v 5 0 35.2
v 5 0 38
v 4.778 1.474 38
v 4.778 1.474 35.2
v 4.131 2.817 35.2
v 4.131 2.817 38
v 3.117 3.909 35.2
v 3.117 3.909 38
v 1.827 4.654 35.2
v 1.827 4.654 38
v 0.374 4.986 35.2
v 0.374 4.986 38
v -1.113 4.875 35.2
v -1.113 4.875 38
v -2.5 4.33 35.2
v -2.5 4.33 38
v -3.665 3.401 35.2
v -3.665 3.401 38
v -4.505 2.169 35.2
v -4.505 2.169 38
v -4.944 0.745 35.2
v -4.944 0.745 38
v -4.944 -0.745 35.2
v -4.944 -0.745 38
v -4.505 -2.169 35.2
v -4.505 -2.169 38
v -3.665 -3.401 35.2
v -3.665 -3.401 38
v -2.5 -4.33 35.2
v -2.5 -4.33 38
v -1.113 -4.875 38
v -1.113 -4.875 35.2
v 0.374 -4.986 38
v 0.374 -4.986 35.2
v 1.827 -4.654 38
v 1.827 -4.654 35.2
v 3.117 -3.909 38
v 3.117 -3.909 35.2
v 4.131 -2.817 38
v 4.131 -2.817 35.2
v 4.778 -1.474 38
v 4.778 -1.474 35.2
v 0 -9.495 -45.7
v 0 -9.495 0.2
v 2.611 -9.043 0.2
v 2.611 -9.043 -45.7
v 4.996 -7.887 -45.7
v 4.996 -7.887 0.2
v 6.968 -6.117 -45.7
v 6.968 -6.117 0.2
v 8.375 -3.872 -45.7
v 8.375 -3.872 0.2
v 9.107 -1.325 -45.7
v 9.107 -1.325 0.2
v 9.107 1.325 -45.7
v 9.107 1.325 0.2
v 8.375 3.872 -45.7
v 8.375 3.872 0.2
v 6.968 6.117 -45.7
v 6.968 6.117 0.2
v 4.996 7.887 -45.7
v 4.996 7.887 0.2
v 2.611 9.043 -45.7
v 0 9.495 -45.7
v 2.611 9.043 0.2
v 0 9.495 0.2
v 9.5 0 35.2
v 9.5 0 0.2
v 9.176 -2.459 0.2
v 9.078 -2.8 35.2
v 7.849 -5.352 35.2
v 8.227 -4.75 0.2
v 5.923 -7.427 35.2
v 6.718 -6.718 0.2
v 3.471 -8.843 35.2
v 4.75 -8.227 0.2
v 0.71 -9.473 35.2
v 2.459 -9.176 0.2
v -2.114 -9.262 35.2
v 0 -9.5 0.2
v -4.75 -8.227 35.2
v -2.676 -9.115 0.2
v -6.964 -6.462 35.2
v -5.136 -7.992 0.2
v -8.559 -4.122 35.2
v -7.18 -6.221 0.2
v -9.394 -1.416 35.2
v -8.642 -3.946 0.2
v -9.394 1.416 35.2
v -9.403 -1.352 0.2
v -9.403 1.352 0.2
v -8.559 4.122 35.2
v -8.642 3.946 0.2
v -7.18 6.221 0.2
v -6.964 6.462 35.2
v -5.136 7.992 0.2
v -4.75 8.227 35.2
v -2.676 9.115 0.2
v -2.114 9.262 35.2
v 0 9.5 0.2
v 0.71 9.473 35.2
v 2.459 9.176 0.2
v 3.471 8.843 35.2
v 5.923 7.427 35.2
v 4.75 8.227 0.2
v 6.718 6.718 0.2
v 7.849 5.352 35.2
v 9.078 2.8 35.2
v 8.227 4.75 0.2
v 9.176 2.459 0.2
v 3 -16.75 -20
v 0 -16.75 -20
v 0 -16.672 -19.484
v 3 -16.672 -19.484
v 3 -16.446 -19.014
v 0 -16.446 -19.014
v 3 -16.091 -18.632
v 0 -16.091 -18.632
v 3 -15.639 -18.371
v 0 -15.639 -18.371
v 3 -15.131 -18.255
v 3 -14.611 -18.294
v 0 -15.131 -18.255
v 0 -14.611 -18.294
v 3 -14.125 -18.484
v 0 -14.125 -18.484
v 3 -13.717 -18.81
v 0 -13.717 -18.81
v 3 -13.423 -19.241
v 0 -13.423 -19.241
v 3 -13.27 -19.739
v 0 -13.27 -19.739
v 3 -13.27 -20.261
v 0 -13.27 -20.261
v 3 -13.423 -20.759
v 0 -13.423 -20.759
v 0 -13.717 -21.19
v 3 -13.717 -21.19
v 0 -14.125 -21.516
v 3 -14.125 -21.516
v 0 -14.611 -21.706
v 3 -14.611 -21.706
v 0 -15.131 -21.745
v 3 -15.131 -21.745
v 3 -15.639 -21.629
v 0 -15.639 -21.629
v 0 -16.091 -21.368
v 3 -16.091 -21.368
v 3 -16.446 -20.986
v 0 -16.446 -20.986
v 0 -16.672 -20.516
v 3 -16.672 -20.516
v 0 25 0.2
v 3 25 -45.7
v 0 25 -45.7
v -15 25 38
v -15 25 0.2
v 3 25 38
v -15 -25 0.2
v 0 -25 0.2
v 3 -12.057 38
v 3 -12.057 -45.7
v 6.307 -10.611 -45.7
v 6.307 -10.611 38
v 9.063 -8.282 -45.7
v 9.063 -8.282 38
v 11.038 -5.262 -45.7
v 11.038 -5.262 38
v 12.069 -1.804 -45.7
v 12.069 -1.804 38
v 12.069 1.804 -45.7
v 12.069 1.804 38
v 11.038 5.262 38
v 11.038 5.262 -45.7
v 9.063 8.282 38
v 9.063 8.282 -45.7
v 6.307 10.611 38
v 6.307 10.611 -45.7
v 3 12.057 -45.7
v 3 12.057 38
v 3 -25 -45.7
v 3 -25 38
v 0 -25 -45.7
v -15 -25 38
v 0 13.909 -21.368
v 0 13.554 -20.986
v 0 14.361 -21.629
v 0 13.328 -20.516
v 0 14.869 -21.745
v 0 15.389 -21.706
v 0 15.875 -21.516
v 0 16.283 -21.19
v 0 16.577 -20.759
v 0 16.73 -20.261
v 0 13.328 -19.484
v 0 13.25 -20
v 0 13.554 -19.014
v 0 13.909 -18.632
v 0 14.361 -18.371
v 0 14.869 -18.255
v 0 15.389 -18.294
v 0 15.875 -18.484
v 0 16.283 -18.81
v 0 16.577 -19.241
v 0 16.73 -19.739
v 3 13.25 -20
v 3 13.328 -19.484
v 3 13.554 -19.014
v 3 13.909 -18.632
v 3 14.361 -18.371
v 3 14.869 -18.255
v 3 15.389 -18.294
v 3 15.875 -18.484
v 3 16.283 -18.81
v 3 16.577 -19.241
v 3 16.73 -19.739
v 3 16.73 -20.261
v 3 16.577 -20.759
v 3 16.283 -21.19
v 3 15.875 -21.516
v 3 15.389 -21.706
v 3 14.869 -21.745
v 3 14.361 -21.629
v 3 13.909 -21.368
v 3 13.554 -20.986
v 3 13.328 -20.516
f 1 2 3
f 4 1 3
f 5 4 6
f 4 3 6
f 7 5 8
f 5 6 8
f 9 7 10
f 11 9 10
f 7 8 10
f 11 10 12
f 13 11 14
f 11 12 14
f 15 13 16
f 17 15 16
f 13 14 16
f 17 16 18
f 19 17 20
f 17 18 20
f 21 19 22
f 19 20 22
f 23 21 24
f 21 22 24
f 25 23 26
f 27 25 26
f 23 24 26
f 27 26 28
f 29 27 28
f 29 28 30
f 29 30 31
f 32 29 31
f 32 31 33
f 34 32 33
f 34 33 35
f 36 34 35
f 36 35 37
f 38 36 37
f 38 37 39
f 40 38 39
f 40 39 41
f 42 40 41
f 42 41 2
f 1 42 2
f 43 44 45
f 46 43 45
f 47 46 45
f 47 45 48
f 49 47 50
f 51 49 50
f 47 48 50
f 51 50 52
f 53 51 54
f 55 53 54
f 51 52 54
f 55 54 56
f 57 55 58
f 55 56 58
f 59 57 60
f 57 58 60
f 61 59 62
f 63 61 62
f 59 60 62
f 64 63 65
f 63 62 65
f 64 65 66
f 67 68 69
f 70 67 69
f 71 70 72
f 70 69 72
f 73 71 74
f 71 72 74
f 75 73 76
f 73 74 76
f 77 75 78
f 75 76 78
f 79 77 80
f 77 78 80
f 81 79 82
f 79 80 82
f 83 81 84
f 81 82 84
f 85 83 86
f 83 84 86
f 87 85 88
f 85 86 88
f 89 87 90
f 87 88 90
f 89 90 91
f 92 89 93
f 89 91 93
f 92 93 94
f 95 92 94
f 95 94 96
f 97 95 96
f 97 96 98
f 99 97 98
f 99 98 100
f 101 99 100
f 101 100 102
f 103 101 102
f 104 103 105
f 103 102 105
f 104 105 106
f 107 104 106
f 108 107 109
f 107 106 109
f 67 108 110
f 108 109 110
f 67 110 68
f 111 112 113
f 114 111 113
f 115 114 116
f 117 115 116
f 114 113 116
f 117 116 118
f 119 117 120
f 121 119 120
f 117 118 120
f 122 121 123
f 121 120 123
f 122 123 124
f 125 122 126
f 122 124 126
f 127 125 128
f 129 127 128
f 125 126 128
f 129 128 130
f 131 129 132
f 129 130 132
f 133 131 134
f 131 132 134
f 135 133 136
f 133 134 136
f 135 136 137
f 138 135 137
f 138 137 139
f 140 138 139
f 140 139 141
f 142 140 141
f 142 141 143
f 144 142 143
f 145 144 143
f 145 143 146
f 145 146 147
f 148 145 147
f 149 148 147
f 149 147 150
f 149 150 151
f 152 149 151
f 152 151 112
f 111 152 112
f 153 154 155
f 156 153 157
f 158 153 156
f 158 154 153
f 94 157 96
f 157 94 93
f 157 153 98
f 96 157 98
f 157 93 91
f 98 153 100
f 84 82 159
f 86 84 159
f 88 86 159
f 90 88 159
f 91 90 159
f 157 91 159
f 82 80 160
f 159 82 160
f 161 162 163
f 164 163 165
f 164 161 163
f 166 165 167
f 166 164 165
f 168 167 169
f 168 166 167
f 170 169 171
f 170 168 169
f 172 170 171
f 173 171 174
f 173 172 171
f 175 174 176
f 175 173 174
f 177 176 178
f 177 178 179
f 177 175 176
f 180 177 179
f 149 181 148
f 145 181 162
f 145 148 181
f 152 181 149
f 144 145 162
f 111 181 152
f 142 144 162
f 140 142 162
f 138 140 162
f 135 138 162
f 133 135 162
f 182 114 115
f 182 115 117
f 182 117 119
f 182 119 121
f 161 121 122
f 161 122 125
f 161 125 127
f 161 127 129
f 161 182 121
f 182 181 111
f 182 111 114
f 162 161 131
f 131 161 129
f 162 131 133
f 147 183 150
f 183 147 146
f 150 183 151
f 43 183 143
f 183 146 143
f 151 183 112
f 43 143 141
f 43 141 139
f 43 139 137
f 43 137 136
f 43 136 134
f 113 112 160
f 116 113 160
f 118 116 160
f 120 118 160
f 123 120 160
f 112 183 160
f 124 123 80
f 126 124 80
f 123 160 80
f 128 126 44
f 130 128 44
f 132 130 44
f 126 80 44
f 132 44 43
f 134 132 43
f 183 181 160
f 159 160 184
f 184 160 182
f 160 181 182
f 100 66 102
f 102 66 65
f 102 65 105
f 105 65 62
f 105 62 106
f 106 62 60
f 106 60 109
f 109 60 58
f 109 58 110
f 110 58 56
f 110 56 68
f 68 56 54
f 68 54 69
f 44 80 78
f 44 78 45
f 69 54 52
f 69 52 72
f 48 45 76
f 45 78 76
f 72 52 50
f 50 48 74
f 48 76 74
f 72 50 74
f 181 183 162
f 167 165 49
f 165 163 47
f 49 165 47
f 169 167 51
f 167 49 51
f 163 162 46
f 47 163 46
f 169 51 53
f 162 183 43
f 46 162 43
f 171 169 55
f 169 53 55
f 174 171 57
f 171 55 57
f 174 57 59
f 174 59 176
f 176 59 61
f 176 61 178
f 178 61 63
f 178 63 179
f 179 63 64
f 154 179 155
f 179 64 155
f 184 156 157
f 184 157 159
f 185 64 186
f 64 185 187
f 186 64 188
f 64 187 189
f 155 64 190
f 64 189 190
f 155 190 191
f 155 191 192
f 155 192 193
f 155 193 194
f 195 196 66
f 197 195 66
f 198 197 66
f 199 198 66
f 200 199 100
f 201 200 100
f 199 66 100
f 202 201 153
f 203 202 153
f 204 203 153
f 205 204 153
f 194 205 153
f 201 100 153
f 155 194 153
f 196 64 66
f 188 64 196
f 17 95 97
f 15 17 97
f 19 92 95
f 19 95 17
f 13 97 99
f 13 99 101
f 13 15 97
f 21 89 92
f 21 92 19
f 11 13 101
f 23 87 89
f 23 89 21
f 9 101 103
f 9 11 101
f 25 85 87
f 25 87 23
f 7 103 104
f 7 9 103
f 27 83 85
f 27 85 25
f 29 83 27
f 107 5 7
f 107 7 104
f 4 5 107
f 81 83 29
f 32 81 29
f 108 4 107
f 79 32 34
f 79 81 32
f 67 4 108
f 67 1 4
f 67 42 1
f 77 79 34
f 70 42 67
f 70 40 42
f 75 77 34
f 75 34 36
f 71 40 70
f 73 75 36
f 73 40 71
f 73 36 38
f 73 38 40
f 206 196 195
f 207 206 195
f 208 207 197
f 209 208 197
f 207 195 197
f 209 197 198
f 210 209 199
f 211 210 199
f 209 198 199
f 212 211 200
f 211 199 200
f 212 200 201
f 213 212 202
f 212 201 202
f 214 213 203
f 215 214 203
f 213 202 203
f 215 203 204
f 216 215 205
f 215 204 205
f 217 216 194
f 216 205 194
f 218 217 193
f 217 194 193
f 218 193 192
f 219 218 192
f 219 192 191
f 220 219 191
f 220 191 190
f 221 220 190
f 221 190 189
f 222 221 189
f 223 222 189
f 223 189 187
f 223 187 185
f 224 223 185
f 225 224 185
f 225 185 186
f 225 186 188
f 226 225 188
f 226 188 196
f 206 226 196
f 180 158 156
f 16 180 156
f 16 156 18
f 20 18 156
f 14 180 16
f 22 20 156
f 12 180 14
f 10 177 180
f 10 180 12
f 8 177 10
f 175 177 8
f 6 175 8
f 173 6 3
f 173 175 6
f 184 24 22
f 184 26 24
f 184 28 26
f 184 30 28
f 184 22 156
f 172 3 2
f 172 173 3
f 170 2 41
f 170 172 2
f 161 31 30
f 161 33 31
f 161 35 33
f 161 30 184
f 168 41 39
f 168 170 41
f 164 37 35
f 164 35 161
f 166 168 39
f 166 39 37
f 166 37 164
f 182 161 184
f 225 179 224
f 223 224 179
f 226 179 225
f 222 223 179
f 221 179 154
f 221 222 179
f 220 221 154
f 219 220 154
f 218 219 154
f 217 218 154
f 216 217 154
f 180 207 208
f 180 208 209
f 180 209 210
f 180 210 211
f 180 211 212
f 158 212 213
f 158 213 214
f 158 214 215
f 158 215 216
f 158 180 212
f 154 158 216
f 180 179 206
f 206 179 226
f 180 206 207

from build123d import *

# Parameters (mm, degrees)
F1_DEPTH  = 16
F2_R      = 9.5
F3_DEPTH  = 35
F5_DEPTH  = 40
F6_DEPTH  = 45.7
F7_W      = 50
F7_H      = 37.8
F8_DEPTH  = 15
F9_R      = 9.5
F10_DEPTH = 35
F11_R     = 5
F12_DEPTH = 25
F13_R     = 1.75
F14_DEPTH = 5


with BuildPart() as f1:
    # F0 (on Right) → F1 (new body)
    with BuildSketch(Plane.YZ):
        Polygon((-25, 0), (0, 0), (25, 0), (25, 38), (-25, 38), align=None)
    extrude(amount=F1_DEPTH)

    # F2 (on face) → F3 (cut)
    with BuildSketch(Plane(origin=(0, 0, 0), x_dir=(1, 0, 0), z_dir=(0, 0, -1))):
        with Locations((-0.3, 0)):
            Circle(F2_R)
    extrude(amount=-F3_DEPTH, mode=Mode.SUBTRACT)

    # F4 (on face) → F5 (cut)
    with BuildSketch(Plane(origin=(0, 0, 0), x_dir=(1, 0, 0), z_dir=(0, 0, -1))):
        with BuildLine():
            Line((16, 25), (3, 25))
            Line((3, 25), (3, 12.0565332544))
            ThreePointArc((3, 12.0565332544), (12.1999997646, 0), (3, -12.0565332544))
            Line((3, -12.0565332544), (3, -25))
            Line((3, -25), (16, -25))
            Line((16, -25), (16, 25))
        make_face()
    extrude(amount=-F5_DEPTH, mode=Mode.SUBTRACT)

    # F6 (add): a face of the model
    f6_faces = [f1.faces().sort_by_distance(p)[0] for p in [
        (0.514668825, -17.2476309882, 0),
    ]]
    extrude(f6_faces, amount=F6_DEPTH)

    # F7 (on face) → F8 (join)
    with BuildSketch(Plane(origin=(0, 0, 0), x_dir=(0, -1, 0), z_dir=(-1, 0, 0))):
        with Locations((0, 19.1)):
            Rectangle(F7_W, F7_H)
    extrude(amount=F8_DEPTH)

    # F9 (on face) → F10 (cut)
    with BuildSketch(Plane(origin=(0, 0, 0.2), x_dir=(1, 0, 0), z_dir=(0, 0, -1))):
        Circle(F9_R)
    extrude(amount=-F10_DEPTH, mode=Mode.SUBTRACT)

    # F11 (on face) → F12 (cut)
    with BuildSketch(Plane.XY.offset(38)):
        Circle(F11_R)
    extrude(amount=-F12_DEPTH, mode=Mode.SUBTRACT)

    # F13 (on face) → F14 (cut)
    with BuildSketch(Plane(origin=(0, 0, 0), x_dir=(0, -1, 0), z_dir=(-1, 0, 0))):
        with Locations((-15, -20)):
            Circle(F13_R)
        with Locations((15, -20)):
            Circle(F13_R)
    extrude(amount=-F14_DEPTH, mode=Mode.SUBTRACT)


solid = f1.part
